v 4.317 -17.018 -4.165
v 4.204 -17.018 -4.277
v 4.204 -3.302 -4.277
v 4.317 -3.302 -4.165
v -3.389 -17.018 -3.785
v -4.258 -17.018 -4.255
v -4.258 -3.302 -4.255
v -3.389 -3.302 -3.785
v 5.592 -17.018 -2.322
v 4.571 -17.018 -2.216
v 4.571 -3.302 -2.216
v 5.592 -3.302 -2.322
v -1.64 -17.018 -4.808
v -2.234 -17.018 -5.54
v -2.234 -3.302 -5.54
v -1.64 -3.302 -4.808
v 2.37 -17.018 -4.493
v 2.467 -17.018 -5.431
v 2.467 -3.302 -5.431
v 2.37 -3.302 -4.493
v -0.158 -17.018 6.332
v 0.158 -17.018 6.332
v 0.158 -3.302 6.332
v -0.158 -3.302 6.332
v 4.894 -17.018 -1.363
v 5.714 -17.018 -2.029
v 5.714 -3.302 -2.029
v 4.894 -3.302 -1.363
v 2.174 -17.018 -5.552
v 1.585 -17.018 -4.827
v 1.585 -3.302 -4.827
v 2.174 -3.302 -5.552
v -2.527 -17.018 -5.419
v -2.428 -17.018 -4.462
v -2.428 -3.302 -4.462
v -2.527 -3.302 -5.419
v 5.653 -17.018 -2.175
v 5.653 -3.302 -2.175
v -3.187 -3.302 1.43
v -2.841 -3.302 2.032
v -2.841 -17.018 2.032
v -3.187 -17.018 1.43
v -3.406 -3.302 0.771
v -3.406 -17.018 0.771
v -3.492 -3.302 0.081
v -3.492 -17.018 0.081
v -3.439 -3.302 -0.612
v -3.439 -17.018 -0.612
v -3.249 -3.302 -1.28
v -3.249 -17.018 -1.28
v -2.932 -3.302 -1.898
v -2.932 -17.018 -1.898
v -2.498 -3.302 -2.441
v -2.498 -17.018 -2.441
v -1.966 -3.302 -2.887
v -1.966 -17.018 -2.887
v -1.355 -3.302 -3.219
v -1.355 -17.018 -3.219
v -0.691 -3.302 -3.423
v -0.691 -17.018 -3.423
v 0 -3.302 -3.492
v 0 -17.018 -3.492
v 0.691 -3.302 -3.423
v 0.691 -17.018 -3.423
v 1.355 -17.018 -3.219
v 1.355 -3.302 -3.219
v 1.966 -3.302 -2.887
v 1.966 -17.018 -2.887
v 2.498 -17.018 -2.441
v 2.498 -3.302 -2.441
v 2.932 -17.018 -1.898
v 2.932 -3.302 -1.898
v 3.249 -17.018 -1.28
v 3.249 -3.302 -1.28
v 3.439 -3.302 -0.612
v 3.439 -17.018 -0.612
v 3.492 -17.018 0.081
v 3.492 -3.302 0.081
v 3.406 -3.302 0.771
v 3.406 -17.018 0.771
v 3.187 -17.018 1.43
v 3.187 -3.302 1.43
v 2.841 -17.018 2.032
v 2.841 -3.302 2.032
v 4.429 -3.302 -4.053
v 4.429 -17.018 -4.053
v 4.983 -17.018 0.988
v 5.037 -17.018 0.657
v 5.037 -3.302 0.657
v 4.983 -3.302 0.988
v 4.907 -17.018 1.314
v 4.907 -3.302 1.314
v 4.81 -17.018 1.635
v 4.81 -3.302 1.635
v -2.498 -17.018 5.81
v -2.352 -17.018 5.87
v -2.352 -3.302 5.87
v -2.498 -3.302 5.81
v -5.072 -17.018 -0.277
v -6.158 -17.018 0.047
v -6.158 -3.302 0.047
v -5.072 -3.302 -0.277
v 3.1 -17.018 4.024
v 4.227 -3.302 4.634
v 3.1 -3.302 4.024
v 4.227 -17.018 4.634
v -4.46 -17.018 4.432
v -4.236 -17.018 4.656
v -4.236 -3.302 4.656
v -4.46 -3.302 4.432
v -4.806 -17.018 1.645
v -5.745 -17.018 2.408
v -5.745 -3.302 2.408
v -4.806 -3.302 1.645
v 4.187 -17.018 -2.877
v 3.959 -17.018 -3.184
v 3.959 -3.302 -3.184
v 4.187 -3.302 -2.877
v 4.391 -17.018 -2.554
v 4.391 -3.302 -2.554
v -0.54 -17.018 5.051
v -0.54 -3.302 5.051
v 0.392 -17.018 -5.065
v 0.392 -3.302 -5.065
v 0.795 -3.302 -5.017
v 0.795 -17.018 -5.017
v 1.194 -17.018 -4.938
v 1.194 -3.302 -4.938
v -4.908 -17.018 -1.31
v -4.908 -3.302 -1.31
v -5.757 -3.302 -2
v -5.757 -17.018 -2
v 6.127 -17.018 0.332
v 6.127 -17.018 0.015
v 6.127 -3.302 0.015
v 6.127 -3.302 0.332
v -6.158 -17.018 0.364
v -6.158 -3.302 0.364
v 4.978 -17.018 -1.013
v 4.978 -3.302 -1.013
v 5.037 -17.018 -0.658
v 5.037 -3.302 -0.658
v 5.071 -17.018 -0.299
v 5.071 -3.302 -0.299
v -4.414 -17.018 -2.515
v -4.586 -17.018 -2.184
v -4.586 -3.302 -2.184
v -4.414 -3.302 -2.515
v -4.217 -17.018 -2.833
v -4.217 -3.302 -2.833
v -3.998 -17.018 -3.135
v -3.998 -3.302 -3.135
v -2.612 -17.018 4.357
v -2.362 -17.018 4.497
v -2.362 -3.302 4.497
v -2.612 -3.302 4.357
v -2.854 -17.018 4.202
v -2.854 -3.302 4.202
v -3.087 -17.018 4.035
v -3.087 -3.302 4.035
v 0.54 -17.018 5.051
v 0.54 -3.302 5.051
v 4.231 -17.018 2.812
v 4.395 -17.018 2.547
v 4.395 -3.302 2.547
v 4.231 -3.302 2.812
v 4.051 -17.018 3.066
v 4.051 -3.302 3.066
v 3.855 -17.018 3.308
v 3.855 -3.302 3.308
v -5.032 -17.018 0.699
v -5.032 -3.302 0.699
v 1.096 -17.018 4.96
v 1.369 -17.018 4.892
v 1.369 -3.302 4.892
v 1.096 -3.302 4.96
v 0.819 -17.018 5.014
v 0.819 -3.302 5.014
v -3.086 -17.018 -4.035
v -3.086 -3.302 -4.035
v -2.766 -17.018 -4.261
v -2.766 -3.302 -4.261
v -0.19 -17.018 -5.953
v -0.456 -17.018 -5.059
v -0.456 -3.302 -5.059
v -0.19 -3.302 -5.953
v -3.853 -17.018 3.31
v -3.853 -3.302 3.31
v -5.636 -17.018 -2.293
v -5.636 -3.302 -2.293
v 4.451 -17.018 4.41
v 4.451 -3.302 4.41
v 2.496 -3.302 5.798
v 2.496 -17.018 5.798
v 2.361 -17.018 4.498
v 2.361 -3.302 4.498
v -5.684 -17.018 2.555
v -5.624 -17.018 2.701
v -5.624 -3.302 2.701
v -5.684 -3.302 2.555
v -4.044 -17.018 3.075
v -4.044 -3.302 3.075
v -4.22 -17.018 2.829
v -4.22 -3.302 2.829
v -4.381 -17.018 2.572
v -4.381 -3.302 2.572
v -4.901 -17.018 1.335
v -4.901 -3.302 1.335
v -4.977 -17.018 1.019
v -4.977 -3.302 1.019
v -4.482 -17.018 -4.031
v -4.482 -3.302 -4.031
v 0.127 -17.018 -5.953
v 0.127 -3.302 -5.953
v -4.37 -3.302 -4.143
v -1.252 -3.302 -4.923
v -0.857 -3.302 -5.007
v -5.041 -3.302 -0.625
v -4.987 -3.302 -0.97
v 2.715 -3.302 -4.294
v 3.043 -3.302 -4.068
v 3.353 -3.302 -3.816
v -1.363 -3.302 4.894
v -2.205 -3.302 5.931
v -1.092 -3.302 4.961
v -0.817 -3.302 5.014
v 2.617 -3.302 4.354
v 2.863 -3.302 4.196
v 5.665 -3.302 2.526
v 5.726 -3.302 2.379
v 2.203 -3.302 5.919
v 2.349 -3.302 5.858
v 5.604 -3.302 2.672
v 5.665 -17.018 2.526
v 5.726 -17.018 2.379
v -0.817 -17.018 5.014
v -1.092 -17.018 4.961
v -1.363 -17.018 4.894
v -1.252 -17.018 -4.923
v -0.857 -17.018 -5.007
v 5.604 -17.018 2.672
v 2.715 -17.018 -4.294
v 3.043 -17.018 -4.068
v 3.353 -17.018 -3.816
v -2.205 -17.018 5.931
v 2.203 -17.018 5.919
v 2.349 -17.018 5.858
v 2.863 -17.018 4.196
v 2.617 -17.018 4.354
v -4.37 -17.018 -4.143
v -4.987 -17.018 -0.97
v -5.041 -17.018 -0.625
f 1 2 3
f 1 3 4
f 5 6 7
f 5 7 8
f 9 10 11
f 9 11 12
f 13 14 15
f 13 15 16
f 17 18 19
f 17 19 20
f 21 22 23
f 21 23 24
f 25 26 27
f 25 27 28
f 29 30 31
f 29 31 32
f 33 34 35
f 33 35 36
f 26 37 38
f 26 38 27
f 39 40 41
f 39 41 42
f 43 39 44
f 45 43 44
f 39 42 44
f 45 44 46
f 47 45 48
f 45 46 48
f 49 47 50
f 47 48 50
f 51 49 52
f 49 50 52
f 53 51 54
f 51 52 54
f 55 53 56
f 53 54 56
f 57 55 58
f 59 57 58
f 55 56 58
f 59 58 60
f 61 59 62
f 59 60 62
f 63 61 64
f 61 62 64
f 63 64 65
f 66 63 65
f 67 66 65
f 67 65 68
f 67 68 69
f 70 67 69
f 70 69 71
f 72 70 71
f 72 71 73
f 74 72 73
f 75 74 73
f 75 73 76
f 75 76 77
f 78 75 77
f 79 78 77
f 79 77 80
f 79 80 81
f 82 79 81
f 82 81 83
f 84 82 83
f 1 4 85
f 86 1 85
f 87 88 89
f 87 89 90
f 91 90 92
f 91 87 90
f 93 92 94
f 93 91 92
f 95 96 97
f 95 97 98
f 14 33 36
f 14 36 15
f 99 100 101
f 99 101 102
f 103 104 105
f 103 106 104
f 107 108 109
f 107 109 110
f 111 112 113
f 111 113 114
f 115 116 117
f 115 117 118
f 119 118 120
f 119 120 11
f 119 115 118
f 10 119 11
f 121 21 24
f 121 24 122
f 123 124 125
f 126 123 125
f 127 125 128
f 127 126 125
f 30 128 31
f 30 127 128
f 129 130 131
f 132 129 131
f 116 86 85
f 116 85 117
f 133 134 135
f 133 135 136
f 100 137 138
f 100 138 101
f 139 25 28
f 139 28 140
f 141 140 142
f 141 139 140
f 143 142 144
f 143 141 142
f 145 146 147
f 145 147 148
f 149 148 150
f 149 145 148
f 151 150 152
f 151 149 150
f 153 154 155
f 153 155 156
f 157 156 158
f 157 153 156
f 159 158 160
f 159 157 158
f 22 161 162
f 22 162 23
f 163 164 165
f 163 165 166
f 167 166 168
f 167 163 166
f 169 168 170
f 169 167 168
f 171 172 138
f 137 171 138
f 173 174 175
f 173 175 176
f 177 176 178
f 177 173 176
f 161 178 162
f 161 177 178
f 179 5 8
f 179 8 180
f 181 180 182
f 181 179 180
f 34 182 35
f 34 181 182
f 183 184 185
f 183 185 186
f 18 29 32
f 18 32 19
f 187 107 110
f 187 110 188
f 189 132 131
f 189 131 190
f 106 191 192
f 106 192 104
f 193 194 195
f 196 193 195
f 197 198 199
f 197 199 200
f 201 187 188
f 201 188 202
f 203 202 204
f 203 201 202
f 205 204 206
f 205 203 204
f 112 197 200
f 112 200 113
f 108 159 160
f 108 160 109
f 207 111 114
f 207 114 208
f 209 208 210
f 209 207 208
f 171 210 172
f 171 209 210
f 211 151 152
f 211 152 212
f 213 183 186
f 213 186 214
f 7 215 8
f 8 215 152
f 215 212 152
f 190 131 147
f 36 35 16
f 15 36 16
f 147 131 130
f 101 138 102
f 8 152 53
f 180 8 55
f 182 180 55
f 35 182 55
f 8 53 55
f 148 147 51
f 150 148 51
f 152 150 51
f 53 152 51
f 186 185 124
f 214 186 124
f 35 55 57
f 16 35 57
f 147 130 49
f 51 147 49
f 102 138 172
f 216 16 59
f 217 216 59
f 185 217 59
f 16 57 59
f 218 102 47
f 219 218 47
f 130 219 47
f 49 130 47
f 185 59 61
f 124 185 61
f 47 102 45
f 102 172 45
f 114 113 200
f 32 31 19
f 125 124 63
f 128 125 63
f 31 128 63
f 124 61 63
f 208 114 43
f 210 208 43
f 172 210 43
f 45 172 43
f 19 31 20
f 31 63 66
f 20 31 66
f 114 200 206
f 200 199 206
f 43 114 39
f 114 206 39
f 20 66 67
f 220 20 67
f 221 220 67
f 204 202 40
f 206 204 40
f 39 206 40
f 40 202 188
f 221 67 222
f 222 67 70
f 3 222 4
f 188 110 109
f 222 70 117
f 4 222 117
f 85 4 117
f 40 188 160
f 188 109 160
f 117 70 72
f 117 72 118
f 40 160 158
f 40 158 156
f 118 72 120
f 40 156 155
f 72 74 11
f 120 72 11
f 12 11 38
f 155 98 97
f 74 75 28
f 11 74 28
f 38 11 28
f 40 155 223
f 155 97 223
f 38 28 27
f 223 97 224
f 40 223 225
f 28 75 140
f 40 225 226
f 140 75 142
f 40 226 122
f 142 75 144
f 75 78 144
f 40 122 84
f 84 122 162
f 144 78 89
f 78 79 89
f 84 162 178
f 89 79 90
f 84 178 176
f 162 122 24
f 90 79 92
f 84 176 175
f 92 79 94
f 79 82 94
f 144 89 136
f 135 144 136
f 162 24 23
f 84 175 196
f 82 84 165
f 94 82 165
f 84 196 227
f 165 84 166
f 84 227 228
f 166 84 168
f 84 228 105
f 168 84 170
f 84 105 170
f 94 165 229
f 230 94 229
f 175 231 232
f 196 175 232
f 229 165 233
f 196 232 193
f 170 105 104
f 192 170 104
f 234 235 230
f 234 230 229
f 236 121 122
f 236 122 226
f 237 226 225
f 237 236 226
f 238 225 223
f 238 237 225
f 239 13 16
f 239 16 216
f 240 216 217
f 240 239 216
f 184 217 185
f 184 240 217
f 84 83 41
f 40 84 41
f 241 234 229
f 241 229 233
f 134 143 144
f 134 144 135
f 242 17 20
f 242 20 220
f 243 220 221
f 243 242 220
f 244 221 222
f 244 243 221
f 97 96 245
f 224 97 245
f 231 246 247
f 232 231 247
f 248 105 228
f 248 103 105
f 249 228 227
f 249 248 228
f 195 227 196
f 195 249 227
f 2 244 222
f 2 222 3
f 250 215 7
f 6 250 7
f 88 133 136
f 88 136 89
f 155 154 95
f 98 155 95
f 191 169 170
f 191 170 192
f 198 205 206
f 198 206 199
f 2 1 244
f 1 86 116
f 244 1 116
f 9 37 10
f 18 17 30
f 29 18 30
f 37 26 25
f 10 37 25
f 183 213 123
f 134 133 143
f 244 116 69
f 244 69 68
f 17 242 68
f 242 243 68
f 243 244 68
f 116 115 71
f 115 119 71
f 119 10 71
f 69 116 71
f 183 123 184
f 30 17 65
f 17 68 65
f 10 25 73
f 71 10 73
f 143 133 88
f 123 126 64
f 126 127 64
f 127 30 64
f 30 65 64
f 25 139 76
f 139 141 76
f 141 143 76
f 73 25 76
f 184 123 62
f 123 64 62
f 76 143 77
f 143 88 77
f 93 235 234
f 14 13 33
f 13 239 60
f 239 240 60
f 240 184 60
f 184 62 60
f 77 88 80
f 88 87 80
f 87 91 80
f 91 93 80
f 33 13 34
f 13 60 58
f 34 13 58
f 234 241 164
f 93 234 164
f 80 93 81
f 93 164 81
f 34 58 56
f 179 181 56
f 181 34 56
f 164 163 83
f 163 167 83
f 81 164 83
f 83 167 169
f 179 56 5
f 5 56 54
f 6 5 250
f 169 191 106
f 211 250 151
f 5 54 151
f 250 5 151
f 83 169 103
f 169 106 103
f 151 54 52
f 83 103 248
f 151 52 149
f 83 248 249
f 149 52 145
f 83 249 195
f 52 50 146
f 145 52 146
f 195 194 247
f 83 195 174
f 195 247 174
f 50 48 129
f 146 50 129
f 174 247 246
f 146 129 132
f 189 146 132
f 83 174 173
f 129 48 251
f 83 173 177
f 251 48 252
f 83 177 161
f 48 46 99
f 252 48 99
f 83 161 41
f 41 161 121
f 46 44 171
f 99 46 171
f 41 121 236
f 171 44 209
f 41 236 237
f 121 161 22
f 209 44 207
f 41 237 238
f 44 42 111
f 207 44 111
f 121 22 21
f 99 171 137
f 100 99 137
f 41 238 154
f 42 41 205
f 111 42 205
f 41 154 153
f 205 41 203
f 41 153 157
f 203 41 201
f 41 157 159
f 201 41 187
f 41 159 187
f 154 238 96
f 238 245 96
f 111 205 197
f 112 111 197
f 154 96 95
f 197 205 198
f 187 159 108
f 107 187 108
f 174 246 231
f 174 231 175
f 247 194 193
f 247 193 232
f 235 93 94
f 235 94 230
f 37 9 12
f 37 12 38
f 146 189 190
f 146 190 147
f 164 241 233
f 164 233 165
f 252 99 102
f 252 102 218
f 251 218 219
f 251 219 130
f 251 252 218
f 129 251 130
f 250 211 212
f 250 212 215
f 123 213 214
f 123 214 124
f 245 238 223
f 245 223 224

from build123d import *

# Parameters (mm, degrees)
F1_DEPTH      = 8.382
F2_R          = 3.4925
F4_DEPTH      = 25.4
F4_DEPTH_BACK = 25.4
F5_R          = 3.4925
F6_DEPTH      = 17.018
F3_R          = 12.173487119
F3_R_2        = 5.08
F7_DEPTH      = 8.636
F9_DEPTH      = 8.636
F10_DEPTH     = 8.382
F11_DEPTH     = 8.382
F12_DEPTH     = 5.08
F14_DEPTH     = 13.716


with BuildPart() as f1:
    # F0 (on Front) → F1 (new body)
    with BuildSketch(Plane.XZ):
        with BuildLine():
            ThreePointArc((6.1828297209, -0.9138471655), (6.2331848102, -0.4581562201), (6.25, 0))
            ThreePointArc((6.25, 0), (6.2331848102, 0.4581562201), (6.1828297209, 0.9138471655))
            ThreePointArc((6.1828297209, 0.9138471655), (5.4126587737, 3.125), (3.8828297209, 4.8975640229))
            ThreePointArc((3.8828297209, 4.8975640229), (3.125, 5.4126587737), (2.3, 5.8114111883))
            ThreePointArc((2.3, 5.8114111883), (1.170722015, 6.1393737436), (0, 6.25))
            ThreePointArc((0, 6.25), (-1.170722015, 6.1393737436), (-2.3, 5.8114111883))
            ThreePointArc((-2.3, 5.8114111883), (-3.125, 5.4126587737), (-3.8828297209, 4.8975640229))
            ThreePointArc((-3.8828297209, 4.8975640229), (-5.4126587737, 3.125), (-6.1828297209, 0.9138471655))
            ThreePointArc((-6.1828297209, 0.9138471655), (-6.25, 0), (-6.1828297209, -0.9138471655))
            ThreePointArc((-6.1828297209, -0.9138471655), (-5.4126587737, -3.125), (-3.8828297209, -4.8975640229))
            ThreePointArc((-3.8828297209, -4.8975640229), (-3.125, -5.4126587737), (-2.3, -5.8114111883))
            ThreePointArc((-2.3, -5.8114111883), (0, -6.25), (2.3, -5.8114111883))
            ThreePointArc((2.3, -5.8114111883), (3.125, -5.4126587737), (3.8828297209, -4.8975640229))
            ThreePointArc((3.8828297209, -4.8975640229), (5.4126587737, -3.125), (6.1828297209, -0.9138471655))
        make_face()
        with BuildLine():
            ThreePointArc((3.8828297209, 4.8975640229), (5.4126587737, 3.125), (6.1828297209, 0.9138471655))
            Line((6.1828297209, 0.9138471655), (8.490734985, 3.7936156124))
            Line((8.490734985, 3.7936156124), (8.010734985, 4.625))
            Line((8.010734985, 4.625), (7.530734985, 5.4563843876))
            Line((7.530734985, 5.4563843876), (3.8828297209, 4.8975640229))
        make_face()
        with BuildLine():
            Line((8.490734985, -3.7936156124), (6.1828297209, -0.9138471655))
            ThreePointArc((6.1828297209, -0.9138471655), (5.4126587737, -3.125), (3.8828297209, -4.8975640229))
            Line((3.8828297209, -4.8975640229), (7.530734985, -5.4563843876))
            Line((7.530734985, -5.4563843876), (8.010734985, -4.625))
            Line((8.010734985, -4.625), (8.490734985, -3.7936156124))
        make_face()
        with BuildLine():
            ThreePointArc((0, 6.25), (1.170722015, 6.1393737436), (2.3, 5.8114111883))
            Line((2.3, 5.8114111883), (0.96, 9.25))
            Line((0.96, 9.25), (0, 9.25))
            Line((0, 9.25), (0, 6.25))
        make_face()
        with BuildLine():
            Line((0.96, -9.25), (2.3, -5.8114111883))
            ThreePointArc((2.3, -5.8114111883), (0, -6.25), (-2.3, -5.8114111883))
            Line((-2.3, -5.8114111883), (-0.96, -9.25))
            Line((-0.96, -9.25), (0, -9.25))
            Line((0, -9.25), (0.96, -9.25))
        make_face()
        with BuildLine():
            ThreePointArc((-2.3, 5.8114111883), (-1.170722015, 6.1393737436), (0, 6.25))
            Line((0, 6.25), (0, 9.25))
            Line((0, 9.25), (-0.96, 9.25))
            Line((-0.96, 9.25), (-2.3, 5.8114111883))
        make_face()
        with BuildLine():
            Line((-7.530734985, -5.4563843876), (-3.8828297209, -4.8975640229))
            ThreePointArc((-3.8828297209, -4.8975640229), (-5.4126587737, -3.125), (-6.1828297209, -0.9138471655))
            Line((-6.1828297209, -0.9138471655), (-8.490734985, -3.7936156124))
            Line((-8.490734985, -3.7936156124), (-8.010734985, -4.625))
            Line((-8.010734985, -4.625), (-7.530734985, -5.4563843876))
        make_face()
        with BuildLine():
            ThreePointArc((-6.1828297209, 0.9138471655), (-5.4126587737, 3.125), (-3.8828297209, 4.8975640229))
            Line((-3.8828297209, 4.8975640229), (-7.530734985, 5.4563843876))
            Line((-7.530734985, 5.4563843876), (-8.010734985, 4.625))
            Line((-8.010734985, 4.625), (-8.490734985, 3.7936156124))
            Line((-8.490734985, 3.7936156124), (-6.1828297209, 0.9138471655))
        make_face()
    extrude(amount=F1_DEPTH)

    # F2 (on face) → F4 (cut, two sides)
    with BuildSketch(Plane.XZ.offset(8.382)) as f4_sk:
        Circle(F2_R)
    extrude(amount=-F4_DEPTH, mode=Mode.SUBTRACT)
    extrude(f4_sk.sketch, amount=F4_DEPTH_BACK, mode=Mode.SUBTRACT)

    # F5 (on face) → F6 (join)
    with BuildSketch(Plane.XZ.offset(8.382)):
        with BuildLine():
            ThreePointArc((6.1828297209, -0.9138471655), (6.25, 0), (6.1828297209, 0.9138471655))
            Line((6.1828297209, 0.9138471655), (8.490734985, 3.7936156124))
            Line((8.490734985, 3.7936156124), (7.530734985, 5.4563843876))
            Line((7.530734985, 5.4563843876), (3.8828297209, 4.8975640229))
            ThreePointArc((3.8828297209, 4.8975640229), (3.125, 5.4126587737), (2.3, 5.8114111883))
            Line((2.3, 5.8114111883), (0.96, 9.25))
            Line((0.96, 9.25), (-0.96, 9.25))
            Line((-0.96, 9.25), (-2.3, 5.8114111883))
            ThreePointArc((-2.3, 5.8114111883), (-3.125, 5.4126587737), (-3.8828297209, 4.8975640229))
            Line((-3.8828297209, 4.8975640229), (-7.530734985, 5.4563843876))
            Line((-7.530734985, 5.4563843876), (-8.490734985, 3.7936156124))
            Line((-8.490734985, 3.7936156124), (-6.1828297209, 0.9138471655))
            ThreePointArc((-6.1828297209, 0.9138471655), (-6.25, 0), (-6.1828297209, -0.9138471655))
            Line((-6.1828297209, -0.9138471655), (-8.490734985, -3.7936156124))
            Line((-8.490734985, -3.7936156124), (-7.530734985, -5.4563843876))
            Line((-7.530734985, -5.4563843876), (-3.8828297209, -4.8975640229))
            ThreePointArc((-3.8828297209, -4.8975640229), (-3.125, -5.4126587737), (-2.3, -5.8114111883))
            Line((-2.3, -5.8114111883), (-0.96, -9.25))
            Line((-0.96, -9.25), (0.96, -9.25))
            Line((0.96, -9.25), (2.3, -5.8114111883))
            ThreePointArc((2.3, -5.8114111883), (3.125, -5.4126587737), (3.8828297209, -4.8975640229))
            Line((3.8828297209, -4.8975640229), (7.530734985, -5.4563843876))
            Line((7.530734985, -5.4563843876), (8.490734985, -3.7936156124))
            Line((8.490734985, -3.7936156124), (6.1828297209, -0.9138471655))
        make_face()
        Circle(F5_R, mode=Mode.SUBTRACT)
    extrude(amount=F6_DEPTH)

    # F3 (on face) → F7 (cut)
    with BuildSketch(Plane.XZ.offset(8.382)):
        Circle(F3_R)
        Circle(F3_R_2, mode=Mode.SUBTRACT)
    extrude(amount=F7_DEPTH, mode=Mode.SUBTRACT)

    # F8 (on face) → F9 (join)
    with BuildSketch(Plane.XZ.offset(8.382)):
        Polygon((0, 6.331880849), (-0.1584395108, 6.331880849), (-0.5401262814, 5.0512041733), (-0.5212335788, 4.7746545562), (0, 4.7746545562), (0.5212335788, 4.7746545562), (0.5401262814, 5.0512041733), (0.1584395108, 6.331880849), align=None)
        Polygon((-2.3517561236, 5.8703246961), (-2.4981351448, 5.8096925202), (-2.3606739939, 4.4804363484), (-2.237388456, 4.2321677417), (-1.7558314209, 4.4316351967), (-1.2742743857, 4.6311026517), (-1.3626507612, 4.8938311069), (-2.2053771024, 5.9309568719), align=None)
        Polygon((-4.3478655788, 4.5439243078), (-4.4598992313, 4.4318906553), (-3.8242173731, 3.2564221897), (-3.6153081055, 3.0742312382), (-3.2467403073, 3.4427990364), (-2.8781725091, 3.8113668345), (-3.0603634606, 4.0202761022), (-4.2358319262, 4.6559579604), align=None)
        Polygon((-5.6844387958, 2.5546121196), (-5.7450709717, 2.4082330984), (-4.7079452067, 1.5655067572), (-4.4452167514, 1.4771303817), (-4.2457492964, 1.9586874169), (-4.0462818414, 2.440244452), (-4.2945504481, 2.5635299899), (-5.62380662, 2.7009911408), align=None)
        Polygon((-6.1579946185, 0.2052428787), (-6.1579946185, 0.0468033679), (-4.8773179428, -0.3348834026), (-4.6007683257, -0.3159907001), (-4.6007683257, 0.2052428787), (-4.6007683257, 0.7264764576), (-4.8773179428, 0.7453691601), (-6.1579946185, 0.3636823896), align=None)
        Polygon((-5.6964384656, -2.1465132448), (-5.6358062898, -2.292892266), (-4.3065501179, -2.1554311152), (-4.0582815112, -2.0321455773), (-4.2577489662, -1.5505885421), (-4.4572164212, -1.069031507), (-4.7199448764, -1.1574078825), (-5.7570706414, -2.0001342236), align=None)
        Polygon((-4.3700380774, -4.1426227), (-4.2580044249, -4.2546563526), (-3.0825359593, -3.6189744944), (-2.9003450077, -3.4100652267), (-3.2689128059, -3.0414974286), (-3.6374806041, -2.6729296304), (-3.8463898718, -2.8551205819), (-4.4820717299, -4.0305890475), align=None)
        Polygon((-2.3807258891, -5.4791959171), (-2.2343468679, -5.5398280929), (-1.3916205268, -4.5027023279), (-1.3032441513, -4.2399738727), (-1.7848011864, -4.0405064177), (-2.2663582216, -3.8410389627), (-2.3896437594, -4.0893075694), (-2.5271049103, -5.4185637413), align=None)
        Polygon((-0.0313566483, -5.9527517398), (0.1270828626, -5.9527517398), (0.5087696331, -4.6720750641), (0.4898769306, -4.395525447), (-0.0313566483, -4.395525447), (-0.5525902271, -4.395525447), (-0.5714829296, -4.6720750641), (-0.1897961591, -5.9527517398), align=None)
        Polygon((2.3203994753, -5.4911955869), (2.4667784965, -5.4305634111), (2.3293173456, -4.1013072392), (2.2060318077, -3.8530386325), (1.7244747726, -4.0525060875), (1.2429177375, -4.2519735425), (1.331294113, -4.5147019977), (2.1740204541, -5.5518277627), align=None)
        Polygon((4.3165089305, -4.1647951987), (4.428542583, -4.0527615461), (3.7928607249, -2.8772930805), (3.5839514572, -2.695102129), (3.215383659, -3.0636699272), (2.8468158608, -3.4322377254), (3.0290068124, -3.641146993), (4.204475278, -4.2768288512), align=None)
        Polygon((5.6530821475, -2.1754830104), (5.7137143234, -2.0291039892), (4.6765885584, -1.1863776481), (4.4138601032, -1.0980012726), (4.2143926482, -1.5795583077), (4.0149251931, -2.0611153428), (4.2631937999, -2.1844008807), (5.5924499717, -2.3218620316), align=None)
        Polygon((6.1266379702, 0.1738862305), (6.1266379702, 0.3323257413), (4.8459612946, 0.7140125118), (4.5694116774, 0.6951198093), (4.5694116774, 0.1738862305), (4.5694116774, -0.3473473484), (4.8459612946, -0.3662400509), (6.1266379702, 0.0154467196), align=None)
        Polygon((5.6650818173, 2.525642354), (5.6044496415, 2.6720213752), (4.2751934697, 2.5345602243), (4.0269248629, 2.4112746865), (4.2263923179, 1.9297176513), (4.425859773, 1.4481606162), (4.6885882282, 1.5365369917), (5.7257139932, 2.3792633328), align=None)
        Polygon((4.3386814291, 4.5217518092), (4.2266477766, 4.6337854617), (3.051179311, 3.9981036036), (2.8689883595, 3.7891943359), (3.2375561576, 3.4206265377), (3.6061239558, 3.0520587396), (3.8150332235, 3.2342496911), (4.4507150816, 4.4097181567), align=None)
        Polygon((2.3493692408, 5.8583250263), (2.2029902196, 5.9189572021), (1.3602638785, 4.8818314371), (1.271887503, 4.6191029819), (1.7534445381, 4.4196355269), (2.2350015733, 4.2201680719), (2.3582871112, 4.4684366786), (2.495748262, 5.7976928504), align=None)
    extrude(amount=F9_DEPTH)

    # F10 (cut): a face of the model
    f10_faces = [f1.faces().sort_by_distance(p)[0] for p in [
        (2.9994392256, -25.4, -5.195181133),
    ]]
    extrude(f10_faces, amount=-F10_DEPTH, mode=Mode.SUBTRACT)

    # F11 (cut): a face of the model
    f11_faces = [f1.faces().sort_by_distance(p)[0] for p in [
        (7.1408252188, 0, 2.5107754394),
    ]]
    extrude(f11_faces, amount=-F11_DEPTH, mode=Mode.SUBTRACT)

    # F12 (add): a face of the model
    f12_faces = [f1.faces().sort_by_distance(p)[0] for p in [
        (-2.257465366, -8.382, 5.1713496699),
    ]]
    extrude(f12_faces, amount=F12_DEPTH)

    # F13 (on face) → F14 (join, through all)
    with BuildSketch(Plane(origin=(0, -3.302, 0), x_dir=(-1, 0, 0), z_dir=(0, 1, 0))):
        with BuildLine():
            Line((-3.0521756738, 2.032), (3.0521756738, 2.032))
            ThreePointArc((3.0521756738, 2.032), (0, 3.6667151981), (-3.0521756738, 2.032))
        make_face()
    extrude(amount=-F14_DEPTH)


solid = f1.part
